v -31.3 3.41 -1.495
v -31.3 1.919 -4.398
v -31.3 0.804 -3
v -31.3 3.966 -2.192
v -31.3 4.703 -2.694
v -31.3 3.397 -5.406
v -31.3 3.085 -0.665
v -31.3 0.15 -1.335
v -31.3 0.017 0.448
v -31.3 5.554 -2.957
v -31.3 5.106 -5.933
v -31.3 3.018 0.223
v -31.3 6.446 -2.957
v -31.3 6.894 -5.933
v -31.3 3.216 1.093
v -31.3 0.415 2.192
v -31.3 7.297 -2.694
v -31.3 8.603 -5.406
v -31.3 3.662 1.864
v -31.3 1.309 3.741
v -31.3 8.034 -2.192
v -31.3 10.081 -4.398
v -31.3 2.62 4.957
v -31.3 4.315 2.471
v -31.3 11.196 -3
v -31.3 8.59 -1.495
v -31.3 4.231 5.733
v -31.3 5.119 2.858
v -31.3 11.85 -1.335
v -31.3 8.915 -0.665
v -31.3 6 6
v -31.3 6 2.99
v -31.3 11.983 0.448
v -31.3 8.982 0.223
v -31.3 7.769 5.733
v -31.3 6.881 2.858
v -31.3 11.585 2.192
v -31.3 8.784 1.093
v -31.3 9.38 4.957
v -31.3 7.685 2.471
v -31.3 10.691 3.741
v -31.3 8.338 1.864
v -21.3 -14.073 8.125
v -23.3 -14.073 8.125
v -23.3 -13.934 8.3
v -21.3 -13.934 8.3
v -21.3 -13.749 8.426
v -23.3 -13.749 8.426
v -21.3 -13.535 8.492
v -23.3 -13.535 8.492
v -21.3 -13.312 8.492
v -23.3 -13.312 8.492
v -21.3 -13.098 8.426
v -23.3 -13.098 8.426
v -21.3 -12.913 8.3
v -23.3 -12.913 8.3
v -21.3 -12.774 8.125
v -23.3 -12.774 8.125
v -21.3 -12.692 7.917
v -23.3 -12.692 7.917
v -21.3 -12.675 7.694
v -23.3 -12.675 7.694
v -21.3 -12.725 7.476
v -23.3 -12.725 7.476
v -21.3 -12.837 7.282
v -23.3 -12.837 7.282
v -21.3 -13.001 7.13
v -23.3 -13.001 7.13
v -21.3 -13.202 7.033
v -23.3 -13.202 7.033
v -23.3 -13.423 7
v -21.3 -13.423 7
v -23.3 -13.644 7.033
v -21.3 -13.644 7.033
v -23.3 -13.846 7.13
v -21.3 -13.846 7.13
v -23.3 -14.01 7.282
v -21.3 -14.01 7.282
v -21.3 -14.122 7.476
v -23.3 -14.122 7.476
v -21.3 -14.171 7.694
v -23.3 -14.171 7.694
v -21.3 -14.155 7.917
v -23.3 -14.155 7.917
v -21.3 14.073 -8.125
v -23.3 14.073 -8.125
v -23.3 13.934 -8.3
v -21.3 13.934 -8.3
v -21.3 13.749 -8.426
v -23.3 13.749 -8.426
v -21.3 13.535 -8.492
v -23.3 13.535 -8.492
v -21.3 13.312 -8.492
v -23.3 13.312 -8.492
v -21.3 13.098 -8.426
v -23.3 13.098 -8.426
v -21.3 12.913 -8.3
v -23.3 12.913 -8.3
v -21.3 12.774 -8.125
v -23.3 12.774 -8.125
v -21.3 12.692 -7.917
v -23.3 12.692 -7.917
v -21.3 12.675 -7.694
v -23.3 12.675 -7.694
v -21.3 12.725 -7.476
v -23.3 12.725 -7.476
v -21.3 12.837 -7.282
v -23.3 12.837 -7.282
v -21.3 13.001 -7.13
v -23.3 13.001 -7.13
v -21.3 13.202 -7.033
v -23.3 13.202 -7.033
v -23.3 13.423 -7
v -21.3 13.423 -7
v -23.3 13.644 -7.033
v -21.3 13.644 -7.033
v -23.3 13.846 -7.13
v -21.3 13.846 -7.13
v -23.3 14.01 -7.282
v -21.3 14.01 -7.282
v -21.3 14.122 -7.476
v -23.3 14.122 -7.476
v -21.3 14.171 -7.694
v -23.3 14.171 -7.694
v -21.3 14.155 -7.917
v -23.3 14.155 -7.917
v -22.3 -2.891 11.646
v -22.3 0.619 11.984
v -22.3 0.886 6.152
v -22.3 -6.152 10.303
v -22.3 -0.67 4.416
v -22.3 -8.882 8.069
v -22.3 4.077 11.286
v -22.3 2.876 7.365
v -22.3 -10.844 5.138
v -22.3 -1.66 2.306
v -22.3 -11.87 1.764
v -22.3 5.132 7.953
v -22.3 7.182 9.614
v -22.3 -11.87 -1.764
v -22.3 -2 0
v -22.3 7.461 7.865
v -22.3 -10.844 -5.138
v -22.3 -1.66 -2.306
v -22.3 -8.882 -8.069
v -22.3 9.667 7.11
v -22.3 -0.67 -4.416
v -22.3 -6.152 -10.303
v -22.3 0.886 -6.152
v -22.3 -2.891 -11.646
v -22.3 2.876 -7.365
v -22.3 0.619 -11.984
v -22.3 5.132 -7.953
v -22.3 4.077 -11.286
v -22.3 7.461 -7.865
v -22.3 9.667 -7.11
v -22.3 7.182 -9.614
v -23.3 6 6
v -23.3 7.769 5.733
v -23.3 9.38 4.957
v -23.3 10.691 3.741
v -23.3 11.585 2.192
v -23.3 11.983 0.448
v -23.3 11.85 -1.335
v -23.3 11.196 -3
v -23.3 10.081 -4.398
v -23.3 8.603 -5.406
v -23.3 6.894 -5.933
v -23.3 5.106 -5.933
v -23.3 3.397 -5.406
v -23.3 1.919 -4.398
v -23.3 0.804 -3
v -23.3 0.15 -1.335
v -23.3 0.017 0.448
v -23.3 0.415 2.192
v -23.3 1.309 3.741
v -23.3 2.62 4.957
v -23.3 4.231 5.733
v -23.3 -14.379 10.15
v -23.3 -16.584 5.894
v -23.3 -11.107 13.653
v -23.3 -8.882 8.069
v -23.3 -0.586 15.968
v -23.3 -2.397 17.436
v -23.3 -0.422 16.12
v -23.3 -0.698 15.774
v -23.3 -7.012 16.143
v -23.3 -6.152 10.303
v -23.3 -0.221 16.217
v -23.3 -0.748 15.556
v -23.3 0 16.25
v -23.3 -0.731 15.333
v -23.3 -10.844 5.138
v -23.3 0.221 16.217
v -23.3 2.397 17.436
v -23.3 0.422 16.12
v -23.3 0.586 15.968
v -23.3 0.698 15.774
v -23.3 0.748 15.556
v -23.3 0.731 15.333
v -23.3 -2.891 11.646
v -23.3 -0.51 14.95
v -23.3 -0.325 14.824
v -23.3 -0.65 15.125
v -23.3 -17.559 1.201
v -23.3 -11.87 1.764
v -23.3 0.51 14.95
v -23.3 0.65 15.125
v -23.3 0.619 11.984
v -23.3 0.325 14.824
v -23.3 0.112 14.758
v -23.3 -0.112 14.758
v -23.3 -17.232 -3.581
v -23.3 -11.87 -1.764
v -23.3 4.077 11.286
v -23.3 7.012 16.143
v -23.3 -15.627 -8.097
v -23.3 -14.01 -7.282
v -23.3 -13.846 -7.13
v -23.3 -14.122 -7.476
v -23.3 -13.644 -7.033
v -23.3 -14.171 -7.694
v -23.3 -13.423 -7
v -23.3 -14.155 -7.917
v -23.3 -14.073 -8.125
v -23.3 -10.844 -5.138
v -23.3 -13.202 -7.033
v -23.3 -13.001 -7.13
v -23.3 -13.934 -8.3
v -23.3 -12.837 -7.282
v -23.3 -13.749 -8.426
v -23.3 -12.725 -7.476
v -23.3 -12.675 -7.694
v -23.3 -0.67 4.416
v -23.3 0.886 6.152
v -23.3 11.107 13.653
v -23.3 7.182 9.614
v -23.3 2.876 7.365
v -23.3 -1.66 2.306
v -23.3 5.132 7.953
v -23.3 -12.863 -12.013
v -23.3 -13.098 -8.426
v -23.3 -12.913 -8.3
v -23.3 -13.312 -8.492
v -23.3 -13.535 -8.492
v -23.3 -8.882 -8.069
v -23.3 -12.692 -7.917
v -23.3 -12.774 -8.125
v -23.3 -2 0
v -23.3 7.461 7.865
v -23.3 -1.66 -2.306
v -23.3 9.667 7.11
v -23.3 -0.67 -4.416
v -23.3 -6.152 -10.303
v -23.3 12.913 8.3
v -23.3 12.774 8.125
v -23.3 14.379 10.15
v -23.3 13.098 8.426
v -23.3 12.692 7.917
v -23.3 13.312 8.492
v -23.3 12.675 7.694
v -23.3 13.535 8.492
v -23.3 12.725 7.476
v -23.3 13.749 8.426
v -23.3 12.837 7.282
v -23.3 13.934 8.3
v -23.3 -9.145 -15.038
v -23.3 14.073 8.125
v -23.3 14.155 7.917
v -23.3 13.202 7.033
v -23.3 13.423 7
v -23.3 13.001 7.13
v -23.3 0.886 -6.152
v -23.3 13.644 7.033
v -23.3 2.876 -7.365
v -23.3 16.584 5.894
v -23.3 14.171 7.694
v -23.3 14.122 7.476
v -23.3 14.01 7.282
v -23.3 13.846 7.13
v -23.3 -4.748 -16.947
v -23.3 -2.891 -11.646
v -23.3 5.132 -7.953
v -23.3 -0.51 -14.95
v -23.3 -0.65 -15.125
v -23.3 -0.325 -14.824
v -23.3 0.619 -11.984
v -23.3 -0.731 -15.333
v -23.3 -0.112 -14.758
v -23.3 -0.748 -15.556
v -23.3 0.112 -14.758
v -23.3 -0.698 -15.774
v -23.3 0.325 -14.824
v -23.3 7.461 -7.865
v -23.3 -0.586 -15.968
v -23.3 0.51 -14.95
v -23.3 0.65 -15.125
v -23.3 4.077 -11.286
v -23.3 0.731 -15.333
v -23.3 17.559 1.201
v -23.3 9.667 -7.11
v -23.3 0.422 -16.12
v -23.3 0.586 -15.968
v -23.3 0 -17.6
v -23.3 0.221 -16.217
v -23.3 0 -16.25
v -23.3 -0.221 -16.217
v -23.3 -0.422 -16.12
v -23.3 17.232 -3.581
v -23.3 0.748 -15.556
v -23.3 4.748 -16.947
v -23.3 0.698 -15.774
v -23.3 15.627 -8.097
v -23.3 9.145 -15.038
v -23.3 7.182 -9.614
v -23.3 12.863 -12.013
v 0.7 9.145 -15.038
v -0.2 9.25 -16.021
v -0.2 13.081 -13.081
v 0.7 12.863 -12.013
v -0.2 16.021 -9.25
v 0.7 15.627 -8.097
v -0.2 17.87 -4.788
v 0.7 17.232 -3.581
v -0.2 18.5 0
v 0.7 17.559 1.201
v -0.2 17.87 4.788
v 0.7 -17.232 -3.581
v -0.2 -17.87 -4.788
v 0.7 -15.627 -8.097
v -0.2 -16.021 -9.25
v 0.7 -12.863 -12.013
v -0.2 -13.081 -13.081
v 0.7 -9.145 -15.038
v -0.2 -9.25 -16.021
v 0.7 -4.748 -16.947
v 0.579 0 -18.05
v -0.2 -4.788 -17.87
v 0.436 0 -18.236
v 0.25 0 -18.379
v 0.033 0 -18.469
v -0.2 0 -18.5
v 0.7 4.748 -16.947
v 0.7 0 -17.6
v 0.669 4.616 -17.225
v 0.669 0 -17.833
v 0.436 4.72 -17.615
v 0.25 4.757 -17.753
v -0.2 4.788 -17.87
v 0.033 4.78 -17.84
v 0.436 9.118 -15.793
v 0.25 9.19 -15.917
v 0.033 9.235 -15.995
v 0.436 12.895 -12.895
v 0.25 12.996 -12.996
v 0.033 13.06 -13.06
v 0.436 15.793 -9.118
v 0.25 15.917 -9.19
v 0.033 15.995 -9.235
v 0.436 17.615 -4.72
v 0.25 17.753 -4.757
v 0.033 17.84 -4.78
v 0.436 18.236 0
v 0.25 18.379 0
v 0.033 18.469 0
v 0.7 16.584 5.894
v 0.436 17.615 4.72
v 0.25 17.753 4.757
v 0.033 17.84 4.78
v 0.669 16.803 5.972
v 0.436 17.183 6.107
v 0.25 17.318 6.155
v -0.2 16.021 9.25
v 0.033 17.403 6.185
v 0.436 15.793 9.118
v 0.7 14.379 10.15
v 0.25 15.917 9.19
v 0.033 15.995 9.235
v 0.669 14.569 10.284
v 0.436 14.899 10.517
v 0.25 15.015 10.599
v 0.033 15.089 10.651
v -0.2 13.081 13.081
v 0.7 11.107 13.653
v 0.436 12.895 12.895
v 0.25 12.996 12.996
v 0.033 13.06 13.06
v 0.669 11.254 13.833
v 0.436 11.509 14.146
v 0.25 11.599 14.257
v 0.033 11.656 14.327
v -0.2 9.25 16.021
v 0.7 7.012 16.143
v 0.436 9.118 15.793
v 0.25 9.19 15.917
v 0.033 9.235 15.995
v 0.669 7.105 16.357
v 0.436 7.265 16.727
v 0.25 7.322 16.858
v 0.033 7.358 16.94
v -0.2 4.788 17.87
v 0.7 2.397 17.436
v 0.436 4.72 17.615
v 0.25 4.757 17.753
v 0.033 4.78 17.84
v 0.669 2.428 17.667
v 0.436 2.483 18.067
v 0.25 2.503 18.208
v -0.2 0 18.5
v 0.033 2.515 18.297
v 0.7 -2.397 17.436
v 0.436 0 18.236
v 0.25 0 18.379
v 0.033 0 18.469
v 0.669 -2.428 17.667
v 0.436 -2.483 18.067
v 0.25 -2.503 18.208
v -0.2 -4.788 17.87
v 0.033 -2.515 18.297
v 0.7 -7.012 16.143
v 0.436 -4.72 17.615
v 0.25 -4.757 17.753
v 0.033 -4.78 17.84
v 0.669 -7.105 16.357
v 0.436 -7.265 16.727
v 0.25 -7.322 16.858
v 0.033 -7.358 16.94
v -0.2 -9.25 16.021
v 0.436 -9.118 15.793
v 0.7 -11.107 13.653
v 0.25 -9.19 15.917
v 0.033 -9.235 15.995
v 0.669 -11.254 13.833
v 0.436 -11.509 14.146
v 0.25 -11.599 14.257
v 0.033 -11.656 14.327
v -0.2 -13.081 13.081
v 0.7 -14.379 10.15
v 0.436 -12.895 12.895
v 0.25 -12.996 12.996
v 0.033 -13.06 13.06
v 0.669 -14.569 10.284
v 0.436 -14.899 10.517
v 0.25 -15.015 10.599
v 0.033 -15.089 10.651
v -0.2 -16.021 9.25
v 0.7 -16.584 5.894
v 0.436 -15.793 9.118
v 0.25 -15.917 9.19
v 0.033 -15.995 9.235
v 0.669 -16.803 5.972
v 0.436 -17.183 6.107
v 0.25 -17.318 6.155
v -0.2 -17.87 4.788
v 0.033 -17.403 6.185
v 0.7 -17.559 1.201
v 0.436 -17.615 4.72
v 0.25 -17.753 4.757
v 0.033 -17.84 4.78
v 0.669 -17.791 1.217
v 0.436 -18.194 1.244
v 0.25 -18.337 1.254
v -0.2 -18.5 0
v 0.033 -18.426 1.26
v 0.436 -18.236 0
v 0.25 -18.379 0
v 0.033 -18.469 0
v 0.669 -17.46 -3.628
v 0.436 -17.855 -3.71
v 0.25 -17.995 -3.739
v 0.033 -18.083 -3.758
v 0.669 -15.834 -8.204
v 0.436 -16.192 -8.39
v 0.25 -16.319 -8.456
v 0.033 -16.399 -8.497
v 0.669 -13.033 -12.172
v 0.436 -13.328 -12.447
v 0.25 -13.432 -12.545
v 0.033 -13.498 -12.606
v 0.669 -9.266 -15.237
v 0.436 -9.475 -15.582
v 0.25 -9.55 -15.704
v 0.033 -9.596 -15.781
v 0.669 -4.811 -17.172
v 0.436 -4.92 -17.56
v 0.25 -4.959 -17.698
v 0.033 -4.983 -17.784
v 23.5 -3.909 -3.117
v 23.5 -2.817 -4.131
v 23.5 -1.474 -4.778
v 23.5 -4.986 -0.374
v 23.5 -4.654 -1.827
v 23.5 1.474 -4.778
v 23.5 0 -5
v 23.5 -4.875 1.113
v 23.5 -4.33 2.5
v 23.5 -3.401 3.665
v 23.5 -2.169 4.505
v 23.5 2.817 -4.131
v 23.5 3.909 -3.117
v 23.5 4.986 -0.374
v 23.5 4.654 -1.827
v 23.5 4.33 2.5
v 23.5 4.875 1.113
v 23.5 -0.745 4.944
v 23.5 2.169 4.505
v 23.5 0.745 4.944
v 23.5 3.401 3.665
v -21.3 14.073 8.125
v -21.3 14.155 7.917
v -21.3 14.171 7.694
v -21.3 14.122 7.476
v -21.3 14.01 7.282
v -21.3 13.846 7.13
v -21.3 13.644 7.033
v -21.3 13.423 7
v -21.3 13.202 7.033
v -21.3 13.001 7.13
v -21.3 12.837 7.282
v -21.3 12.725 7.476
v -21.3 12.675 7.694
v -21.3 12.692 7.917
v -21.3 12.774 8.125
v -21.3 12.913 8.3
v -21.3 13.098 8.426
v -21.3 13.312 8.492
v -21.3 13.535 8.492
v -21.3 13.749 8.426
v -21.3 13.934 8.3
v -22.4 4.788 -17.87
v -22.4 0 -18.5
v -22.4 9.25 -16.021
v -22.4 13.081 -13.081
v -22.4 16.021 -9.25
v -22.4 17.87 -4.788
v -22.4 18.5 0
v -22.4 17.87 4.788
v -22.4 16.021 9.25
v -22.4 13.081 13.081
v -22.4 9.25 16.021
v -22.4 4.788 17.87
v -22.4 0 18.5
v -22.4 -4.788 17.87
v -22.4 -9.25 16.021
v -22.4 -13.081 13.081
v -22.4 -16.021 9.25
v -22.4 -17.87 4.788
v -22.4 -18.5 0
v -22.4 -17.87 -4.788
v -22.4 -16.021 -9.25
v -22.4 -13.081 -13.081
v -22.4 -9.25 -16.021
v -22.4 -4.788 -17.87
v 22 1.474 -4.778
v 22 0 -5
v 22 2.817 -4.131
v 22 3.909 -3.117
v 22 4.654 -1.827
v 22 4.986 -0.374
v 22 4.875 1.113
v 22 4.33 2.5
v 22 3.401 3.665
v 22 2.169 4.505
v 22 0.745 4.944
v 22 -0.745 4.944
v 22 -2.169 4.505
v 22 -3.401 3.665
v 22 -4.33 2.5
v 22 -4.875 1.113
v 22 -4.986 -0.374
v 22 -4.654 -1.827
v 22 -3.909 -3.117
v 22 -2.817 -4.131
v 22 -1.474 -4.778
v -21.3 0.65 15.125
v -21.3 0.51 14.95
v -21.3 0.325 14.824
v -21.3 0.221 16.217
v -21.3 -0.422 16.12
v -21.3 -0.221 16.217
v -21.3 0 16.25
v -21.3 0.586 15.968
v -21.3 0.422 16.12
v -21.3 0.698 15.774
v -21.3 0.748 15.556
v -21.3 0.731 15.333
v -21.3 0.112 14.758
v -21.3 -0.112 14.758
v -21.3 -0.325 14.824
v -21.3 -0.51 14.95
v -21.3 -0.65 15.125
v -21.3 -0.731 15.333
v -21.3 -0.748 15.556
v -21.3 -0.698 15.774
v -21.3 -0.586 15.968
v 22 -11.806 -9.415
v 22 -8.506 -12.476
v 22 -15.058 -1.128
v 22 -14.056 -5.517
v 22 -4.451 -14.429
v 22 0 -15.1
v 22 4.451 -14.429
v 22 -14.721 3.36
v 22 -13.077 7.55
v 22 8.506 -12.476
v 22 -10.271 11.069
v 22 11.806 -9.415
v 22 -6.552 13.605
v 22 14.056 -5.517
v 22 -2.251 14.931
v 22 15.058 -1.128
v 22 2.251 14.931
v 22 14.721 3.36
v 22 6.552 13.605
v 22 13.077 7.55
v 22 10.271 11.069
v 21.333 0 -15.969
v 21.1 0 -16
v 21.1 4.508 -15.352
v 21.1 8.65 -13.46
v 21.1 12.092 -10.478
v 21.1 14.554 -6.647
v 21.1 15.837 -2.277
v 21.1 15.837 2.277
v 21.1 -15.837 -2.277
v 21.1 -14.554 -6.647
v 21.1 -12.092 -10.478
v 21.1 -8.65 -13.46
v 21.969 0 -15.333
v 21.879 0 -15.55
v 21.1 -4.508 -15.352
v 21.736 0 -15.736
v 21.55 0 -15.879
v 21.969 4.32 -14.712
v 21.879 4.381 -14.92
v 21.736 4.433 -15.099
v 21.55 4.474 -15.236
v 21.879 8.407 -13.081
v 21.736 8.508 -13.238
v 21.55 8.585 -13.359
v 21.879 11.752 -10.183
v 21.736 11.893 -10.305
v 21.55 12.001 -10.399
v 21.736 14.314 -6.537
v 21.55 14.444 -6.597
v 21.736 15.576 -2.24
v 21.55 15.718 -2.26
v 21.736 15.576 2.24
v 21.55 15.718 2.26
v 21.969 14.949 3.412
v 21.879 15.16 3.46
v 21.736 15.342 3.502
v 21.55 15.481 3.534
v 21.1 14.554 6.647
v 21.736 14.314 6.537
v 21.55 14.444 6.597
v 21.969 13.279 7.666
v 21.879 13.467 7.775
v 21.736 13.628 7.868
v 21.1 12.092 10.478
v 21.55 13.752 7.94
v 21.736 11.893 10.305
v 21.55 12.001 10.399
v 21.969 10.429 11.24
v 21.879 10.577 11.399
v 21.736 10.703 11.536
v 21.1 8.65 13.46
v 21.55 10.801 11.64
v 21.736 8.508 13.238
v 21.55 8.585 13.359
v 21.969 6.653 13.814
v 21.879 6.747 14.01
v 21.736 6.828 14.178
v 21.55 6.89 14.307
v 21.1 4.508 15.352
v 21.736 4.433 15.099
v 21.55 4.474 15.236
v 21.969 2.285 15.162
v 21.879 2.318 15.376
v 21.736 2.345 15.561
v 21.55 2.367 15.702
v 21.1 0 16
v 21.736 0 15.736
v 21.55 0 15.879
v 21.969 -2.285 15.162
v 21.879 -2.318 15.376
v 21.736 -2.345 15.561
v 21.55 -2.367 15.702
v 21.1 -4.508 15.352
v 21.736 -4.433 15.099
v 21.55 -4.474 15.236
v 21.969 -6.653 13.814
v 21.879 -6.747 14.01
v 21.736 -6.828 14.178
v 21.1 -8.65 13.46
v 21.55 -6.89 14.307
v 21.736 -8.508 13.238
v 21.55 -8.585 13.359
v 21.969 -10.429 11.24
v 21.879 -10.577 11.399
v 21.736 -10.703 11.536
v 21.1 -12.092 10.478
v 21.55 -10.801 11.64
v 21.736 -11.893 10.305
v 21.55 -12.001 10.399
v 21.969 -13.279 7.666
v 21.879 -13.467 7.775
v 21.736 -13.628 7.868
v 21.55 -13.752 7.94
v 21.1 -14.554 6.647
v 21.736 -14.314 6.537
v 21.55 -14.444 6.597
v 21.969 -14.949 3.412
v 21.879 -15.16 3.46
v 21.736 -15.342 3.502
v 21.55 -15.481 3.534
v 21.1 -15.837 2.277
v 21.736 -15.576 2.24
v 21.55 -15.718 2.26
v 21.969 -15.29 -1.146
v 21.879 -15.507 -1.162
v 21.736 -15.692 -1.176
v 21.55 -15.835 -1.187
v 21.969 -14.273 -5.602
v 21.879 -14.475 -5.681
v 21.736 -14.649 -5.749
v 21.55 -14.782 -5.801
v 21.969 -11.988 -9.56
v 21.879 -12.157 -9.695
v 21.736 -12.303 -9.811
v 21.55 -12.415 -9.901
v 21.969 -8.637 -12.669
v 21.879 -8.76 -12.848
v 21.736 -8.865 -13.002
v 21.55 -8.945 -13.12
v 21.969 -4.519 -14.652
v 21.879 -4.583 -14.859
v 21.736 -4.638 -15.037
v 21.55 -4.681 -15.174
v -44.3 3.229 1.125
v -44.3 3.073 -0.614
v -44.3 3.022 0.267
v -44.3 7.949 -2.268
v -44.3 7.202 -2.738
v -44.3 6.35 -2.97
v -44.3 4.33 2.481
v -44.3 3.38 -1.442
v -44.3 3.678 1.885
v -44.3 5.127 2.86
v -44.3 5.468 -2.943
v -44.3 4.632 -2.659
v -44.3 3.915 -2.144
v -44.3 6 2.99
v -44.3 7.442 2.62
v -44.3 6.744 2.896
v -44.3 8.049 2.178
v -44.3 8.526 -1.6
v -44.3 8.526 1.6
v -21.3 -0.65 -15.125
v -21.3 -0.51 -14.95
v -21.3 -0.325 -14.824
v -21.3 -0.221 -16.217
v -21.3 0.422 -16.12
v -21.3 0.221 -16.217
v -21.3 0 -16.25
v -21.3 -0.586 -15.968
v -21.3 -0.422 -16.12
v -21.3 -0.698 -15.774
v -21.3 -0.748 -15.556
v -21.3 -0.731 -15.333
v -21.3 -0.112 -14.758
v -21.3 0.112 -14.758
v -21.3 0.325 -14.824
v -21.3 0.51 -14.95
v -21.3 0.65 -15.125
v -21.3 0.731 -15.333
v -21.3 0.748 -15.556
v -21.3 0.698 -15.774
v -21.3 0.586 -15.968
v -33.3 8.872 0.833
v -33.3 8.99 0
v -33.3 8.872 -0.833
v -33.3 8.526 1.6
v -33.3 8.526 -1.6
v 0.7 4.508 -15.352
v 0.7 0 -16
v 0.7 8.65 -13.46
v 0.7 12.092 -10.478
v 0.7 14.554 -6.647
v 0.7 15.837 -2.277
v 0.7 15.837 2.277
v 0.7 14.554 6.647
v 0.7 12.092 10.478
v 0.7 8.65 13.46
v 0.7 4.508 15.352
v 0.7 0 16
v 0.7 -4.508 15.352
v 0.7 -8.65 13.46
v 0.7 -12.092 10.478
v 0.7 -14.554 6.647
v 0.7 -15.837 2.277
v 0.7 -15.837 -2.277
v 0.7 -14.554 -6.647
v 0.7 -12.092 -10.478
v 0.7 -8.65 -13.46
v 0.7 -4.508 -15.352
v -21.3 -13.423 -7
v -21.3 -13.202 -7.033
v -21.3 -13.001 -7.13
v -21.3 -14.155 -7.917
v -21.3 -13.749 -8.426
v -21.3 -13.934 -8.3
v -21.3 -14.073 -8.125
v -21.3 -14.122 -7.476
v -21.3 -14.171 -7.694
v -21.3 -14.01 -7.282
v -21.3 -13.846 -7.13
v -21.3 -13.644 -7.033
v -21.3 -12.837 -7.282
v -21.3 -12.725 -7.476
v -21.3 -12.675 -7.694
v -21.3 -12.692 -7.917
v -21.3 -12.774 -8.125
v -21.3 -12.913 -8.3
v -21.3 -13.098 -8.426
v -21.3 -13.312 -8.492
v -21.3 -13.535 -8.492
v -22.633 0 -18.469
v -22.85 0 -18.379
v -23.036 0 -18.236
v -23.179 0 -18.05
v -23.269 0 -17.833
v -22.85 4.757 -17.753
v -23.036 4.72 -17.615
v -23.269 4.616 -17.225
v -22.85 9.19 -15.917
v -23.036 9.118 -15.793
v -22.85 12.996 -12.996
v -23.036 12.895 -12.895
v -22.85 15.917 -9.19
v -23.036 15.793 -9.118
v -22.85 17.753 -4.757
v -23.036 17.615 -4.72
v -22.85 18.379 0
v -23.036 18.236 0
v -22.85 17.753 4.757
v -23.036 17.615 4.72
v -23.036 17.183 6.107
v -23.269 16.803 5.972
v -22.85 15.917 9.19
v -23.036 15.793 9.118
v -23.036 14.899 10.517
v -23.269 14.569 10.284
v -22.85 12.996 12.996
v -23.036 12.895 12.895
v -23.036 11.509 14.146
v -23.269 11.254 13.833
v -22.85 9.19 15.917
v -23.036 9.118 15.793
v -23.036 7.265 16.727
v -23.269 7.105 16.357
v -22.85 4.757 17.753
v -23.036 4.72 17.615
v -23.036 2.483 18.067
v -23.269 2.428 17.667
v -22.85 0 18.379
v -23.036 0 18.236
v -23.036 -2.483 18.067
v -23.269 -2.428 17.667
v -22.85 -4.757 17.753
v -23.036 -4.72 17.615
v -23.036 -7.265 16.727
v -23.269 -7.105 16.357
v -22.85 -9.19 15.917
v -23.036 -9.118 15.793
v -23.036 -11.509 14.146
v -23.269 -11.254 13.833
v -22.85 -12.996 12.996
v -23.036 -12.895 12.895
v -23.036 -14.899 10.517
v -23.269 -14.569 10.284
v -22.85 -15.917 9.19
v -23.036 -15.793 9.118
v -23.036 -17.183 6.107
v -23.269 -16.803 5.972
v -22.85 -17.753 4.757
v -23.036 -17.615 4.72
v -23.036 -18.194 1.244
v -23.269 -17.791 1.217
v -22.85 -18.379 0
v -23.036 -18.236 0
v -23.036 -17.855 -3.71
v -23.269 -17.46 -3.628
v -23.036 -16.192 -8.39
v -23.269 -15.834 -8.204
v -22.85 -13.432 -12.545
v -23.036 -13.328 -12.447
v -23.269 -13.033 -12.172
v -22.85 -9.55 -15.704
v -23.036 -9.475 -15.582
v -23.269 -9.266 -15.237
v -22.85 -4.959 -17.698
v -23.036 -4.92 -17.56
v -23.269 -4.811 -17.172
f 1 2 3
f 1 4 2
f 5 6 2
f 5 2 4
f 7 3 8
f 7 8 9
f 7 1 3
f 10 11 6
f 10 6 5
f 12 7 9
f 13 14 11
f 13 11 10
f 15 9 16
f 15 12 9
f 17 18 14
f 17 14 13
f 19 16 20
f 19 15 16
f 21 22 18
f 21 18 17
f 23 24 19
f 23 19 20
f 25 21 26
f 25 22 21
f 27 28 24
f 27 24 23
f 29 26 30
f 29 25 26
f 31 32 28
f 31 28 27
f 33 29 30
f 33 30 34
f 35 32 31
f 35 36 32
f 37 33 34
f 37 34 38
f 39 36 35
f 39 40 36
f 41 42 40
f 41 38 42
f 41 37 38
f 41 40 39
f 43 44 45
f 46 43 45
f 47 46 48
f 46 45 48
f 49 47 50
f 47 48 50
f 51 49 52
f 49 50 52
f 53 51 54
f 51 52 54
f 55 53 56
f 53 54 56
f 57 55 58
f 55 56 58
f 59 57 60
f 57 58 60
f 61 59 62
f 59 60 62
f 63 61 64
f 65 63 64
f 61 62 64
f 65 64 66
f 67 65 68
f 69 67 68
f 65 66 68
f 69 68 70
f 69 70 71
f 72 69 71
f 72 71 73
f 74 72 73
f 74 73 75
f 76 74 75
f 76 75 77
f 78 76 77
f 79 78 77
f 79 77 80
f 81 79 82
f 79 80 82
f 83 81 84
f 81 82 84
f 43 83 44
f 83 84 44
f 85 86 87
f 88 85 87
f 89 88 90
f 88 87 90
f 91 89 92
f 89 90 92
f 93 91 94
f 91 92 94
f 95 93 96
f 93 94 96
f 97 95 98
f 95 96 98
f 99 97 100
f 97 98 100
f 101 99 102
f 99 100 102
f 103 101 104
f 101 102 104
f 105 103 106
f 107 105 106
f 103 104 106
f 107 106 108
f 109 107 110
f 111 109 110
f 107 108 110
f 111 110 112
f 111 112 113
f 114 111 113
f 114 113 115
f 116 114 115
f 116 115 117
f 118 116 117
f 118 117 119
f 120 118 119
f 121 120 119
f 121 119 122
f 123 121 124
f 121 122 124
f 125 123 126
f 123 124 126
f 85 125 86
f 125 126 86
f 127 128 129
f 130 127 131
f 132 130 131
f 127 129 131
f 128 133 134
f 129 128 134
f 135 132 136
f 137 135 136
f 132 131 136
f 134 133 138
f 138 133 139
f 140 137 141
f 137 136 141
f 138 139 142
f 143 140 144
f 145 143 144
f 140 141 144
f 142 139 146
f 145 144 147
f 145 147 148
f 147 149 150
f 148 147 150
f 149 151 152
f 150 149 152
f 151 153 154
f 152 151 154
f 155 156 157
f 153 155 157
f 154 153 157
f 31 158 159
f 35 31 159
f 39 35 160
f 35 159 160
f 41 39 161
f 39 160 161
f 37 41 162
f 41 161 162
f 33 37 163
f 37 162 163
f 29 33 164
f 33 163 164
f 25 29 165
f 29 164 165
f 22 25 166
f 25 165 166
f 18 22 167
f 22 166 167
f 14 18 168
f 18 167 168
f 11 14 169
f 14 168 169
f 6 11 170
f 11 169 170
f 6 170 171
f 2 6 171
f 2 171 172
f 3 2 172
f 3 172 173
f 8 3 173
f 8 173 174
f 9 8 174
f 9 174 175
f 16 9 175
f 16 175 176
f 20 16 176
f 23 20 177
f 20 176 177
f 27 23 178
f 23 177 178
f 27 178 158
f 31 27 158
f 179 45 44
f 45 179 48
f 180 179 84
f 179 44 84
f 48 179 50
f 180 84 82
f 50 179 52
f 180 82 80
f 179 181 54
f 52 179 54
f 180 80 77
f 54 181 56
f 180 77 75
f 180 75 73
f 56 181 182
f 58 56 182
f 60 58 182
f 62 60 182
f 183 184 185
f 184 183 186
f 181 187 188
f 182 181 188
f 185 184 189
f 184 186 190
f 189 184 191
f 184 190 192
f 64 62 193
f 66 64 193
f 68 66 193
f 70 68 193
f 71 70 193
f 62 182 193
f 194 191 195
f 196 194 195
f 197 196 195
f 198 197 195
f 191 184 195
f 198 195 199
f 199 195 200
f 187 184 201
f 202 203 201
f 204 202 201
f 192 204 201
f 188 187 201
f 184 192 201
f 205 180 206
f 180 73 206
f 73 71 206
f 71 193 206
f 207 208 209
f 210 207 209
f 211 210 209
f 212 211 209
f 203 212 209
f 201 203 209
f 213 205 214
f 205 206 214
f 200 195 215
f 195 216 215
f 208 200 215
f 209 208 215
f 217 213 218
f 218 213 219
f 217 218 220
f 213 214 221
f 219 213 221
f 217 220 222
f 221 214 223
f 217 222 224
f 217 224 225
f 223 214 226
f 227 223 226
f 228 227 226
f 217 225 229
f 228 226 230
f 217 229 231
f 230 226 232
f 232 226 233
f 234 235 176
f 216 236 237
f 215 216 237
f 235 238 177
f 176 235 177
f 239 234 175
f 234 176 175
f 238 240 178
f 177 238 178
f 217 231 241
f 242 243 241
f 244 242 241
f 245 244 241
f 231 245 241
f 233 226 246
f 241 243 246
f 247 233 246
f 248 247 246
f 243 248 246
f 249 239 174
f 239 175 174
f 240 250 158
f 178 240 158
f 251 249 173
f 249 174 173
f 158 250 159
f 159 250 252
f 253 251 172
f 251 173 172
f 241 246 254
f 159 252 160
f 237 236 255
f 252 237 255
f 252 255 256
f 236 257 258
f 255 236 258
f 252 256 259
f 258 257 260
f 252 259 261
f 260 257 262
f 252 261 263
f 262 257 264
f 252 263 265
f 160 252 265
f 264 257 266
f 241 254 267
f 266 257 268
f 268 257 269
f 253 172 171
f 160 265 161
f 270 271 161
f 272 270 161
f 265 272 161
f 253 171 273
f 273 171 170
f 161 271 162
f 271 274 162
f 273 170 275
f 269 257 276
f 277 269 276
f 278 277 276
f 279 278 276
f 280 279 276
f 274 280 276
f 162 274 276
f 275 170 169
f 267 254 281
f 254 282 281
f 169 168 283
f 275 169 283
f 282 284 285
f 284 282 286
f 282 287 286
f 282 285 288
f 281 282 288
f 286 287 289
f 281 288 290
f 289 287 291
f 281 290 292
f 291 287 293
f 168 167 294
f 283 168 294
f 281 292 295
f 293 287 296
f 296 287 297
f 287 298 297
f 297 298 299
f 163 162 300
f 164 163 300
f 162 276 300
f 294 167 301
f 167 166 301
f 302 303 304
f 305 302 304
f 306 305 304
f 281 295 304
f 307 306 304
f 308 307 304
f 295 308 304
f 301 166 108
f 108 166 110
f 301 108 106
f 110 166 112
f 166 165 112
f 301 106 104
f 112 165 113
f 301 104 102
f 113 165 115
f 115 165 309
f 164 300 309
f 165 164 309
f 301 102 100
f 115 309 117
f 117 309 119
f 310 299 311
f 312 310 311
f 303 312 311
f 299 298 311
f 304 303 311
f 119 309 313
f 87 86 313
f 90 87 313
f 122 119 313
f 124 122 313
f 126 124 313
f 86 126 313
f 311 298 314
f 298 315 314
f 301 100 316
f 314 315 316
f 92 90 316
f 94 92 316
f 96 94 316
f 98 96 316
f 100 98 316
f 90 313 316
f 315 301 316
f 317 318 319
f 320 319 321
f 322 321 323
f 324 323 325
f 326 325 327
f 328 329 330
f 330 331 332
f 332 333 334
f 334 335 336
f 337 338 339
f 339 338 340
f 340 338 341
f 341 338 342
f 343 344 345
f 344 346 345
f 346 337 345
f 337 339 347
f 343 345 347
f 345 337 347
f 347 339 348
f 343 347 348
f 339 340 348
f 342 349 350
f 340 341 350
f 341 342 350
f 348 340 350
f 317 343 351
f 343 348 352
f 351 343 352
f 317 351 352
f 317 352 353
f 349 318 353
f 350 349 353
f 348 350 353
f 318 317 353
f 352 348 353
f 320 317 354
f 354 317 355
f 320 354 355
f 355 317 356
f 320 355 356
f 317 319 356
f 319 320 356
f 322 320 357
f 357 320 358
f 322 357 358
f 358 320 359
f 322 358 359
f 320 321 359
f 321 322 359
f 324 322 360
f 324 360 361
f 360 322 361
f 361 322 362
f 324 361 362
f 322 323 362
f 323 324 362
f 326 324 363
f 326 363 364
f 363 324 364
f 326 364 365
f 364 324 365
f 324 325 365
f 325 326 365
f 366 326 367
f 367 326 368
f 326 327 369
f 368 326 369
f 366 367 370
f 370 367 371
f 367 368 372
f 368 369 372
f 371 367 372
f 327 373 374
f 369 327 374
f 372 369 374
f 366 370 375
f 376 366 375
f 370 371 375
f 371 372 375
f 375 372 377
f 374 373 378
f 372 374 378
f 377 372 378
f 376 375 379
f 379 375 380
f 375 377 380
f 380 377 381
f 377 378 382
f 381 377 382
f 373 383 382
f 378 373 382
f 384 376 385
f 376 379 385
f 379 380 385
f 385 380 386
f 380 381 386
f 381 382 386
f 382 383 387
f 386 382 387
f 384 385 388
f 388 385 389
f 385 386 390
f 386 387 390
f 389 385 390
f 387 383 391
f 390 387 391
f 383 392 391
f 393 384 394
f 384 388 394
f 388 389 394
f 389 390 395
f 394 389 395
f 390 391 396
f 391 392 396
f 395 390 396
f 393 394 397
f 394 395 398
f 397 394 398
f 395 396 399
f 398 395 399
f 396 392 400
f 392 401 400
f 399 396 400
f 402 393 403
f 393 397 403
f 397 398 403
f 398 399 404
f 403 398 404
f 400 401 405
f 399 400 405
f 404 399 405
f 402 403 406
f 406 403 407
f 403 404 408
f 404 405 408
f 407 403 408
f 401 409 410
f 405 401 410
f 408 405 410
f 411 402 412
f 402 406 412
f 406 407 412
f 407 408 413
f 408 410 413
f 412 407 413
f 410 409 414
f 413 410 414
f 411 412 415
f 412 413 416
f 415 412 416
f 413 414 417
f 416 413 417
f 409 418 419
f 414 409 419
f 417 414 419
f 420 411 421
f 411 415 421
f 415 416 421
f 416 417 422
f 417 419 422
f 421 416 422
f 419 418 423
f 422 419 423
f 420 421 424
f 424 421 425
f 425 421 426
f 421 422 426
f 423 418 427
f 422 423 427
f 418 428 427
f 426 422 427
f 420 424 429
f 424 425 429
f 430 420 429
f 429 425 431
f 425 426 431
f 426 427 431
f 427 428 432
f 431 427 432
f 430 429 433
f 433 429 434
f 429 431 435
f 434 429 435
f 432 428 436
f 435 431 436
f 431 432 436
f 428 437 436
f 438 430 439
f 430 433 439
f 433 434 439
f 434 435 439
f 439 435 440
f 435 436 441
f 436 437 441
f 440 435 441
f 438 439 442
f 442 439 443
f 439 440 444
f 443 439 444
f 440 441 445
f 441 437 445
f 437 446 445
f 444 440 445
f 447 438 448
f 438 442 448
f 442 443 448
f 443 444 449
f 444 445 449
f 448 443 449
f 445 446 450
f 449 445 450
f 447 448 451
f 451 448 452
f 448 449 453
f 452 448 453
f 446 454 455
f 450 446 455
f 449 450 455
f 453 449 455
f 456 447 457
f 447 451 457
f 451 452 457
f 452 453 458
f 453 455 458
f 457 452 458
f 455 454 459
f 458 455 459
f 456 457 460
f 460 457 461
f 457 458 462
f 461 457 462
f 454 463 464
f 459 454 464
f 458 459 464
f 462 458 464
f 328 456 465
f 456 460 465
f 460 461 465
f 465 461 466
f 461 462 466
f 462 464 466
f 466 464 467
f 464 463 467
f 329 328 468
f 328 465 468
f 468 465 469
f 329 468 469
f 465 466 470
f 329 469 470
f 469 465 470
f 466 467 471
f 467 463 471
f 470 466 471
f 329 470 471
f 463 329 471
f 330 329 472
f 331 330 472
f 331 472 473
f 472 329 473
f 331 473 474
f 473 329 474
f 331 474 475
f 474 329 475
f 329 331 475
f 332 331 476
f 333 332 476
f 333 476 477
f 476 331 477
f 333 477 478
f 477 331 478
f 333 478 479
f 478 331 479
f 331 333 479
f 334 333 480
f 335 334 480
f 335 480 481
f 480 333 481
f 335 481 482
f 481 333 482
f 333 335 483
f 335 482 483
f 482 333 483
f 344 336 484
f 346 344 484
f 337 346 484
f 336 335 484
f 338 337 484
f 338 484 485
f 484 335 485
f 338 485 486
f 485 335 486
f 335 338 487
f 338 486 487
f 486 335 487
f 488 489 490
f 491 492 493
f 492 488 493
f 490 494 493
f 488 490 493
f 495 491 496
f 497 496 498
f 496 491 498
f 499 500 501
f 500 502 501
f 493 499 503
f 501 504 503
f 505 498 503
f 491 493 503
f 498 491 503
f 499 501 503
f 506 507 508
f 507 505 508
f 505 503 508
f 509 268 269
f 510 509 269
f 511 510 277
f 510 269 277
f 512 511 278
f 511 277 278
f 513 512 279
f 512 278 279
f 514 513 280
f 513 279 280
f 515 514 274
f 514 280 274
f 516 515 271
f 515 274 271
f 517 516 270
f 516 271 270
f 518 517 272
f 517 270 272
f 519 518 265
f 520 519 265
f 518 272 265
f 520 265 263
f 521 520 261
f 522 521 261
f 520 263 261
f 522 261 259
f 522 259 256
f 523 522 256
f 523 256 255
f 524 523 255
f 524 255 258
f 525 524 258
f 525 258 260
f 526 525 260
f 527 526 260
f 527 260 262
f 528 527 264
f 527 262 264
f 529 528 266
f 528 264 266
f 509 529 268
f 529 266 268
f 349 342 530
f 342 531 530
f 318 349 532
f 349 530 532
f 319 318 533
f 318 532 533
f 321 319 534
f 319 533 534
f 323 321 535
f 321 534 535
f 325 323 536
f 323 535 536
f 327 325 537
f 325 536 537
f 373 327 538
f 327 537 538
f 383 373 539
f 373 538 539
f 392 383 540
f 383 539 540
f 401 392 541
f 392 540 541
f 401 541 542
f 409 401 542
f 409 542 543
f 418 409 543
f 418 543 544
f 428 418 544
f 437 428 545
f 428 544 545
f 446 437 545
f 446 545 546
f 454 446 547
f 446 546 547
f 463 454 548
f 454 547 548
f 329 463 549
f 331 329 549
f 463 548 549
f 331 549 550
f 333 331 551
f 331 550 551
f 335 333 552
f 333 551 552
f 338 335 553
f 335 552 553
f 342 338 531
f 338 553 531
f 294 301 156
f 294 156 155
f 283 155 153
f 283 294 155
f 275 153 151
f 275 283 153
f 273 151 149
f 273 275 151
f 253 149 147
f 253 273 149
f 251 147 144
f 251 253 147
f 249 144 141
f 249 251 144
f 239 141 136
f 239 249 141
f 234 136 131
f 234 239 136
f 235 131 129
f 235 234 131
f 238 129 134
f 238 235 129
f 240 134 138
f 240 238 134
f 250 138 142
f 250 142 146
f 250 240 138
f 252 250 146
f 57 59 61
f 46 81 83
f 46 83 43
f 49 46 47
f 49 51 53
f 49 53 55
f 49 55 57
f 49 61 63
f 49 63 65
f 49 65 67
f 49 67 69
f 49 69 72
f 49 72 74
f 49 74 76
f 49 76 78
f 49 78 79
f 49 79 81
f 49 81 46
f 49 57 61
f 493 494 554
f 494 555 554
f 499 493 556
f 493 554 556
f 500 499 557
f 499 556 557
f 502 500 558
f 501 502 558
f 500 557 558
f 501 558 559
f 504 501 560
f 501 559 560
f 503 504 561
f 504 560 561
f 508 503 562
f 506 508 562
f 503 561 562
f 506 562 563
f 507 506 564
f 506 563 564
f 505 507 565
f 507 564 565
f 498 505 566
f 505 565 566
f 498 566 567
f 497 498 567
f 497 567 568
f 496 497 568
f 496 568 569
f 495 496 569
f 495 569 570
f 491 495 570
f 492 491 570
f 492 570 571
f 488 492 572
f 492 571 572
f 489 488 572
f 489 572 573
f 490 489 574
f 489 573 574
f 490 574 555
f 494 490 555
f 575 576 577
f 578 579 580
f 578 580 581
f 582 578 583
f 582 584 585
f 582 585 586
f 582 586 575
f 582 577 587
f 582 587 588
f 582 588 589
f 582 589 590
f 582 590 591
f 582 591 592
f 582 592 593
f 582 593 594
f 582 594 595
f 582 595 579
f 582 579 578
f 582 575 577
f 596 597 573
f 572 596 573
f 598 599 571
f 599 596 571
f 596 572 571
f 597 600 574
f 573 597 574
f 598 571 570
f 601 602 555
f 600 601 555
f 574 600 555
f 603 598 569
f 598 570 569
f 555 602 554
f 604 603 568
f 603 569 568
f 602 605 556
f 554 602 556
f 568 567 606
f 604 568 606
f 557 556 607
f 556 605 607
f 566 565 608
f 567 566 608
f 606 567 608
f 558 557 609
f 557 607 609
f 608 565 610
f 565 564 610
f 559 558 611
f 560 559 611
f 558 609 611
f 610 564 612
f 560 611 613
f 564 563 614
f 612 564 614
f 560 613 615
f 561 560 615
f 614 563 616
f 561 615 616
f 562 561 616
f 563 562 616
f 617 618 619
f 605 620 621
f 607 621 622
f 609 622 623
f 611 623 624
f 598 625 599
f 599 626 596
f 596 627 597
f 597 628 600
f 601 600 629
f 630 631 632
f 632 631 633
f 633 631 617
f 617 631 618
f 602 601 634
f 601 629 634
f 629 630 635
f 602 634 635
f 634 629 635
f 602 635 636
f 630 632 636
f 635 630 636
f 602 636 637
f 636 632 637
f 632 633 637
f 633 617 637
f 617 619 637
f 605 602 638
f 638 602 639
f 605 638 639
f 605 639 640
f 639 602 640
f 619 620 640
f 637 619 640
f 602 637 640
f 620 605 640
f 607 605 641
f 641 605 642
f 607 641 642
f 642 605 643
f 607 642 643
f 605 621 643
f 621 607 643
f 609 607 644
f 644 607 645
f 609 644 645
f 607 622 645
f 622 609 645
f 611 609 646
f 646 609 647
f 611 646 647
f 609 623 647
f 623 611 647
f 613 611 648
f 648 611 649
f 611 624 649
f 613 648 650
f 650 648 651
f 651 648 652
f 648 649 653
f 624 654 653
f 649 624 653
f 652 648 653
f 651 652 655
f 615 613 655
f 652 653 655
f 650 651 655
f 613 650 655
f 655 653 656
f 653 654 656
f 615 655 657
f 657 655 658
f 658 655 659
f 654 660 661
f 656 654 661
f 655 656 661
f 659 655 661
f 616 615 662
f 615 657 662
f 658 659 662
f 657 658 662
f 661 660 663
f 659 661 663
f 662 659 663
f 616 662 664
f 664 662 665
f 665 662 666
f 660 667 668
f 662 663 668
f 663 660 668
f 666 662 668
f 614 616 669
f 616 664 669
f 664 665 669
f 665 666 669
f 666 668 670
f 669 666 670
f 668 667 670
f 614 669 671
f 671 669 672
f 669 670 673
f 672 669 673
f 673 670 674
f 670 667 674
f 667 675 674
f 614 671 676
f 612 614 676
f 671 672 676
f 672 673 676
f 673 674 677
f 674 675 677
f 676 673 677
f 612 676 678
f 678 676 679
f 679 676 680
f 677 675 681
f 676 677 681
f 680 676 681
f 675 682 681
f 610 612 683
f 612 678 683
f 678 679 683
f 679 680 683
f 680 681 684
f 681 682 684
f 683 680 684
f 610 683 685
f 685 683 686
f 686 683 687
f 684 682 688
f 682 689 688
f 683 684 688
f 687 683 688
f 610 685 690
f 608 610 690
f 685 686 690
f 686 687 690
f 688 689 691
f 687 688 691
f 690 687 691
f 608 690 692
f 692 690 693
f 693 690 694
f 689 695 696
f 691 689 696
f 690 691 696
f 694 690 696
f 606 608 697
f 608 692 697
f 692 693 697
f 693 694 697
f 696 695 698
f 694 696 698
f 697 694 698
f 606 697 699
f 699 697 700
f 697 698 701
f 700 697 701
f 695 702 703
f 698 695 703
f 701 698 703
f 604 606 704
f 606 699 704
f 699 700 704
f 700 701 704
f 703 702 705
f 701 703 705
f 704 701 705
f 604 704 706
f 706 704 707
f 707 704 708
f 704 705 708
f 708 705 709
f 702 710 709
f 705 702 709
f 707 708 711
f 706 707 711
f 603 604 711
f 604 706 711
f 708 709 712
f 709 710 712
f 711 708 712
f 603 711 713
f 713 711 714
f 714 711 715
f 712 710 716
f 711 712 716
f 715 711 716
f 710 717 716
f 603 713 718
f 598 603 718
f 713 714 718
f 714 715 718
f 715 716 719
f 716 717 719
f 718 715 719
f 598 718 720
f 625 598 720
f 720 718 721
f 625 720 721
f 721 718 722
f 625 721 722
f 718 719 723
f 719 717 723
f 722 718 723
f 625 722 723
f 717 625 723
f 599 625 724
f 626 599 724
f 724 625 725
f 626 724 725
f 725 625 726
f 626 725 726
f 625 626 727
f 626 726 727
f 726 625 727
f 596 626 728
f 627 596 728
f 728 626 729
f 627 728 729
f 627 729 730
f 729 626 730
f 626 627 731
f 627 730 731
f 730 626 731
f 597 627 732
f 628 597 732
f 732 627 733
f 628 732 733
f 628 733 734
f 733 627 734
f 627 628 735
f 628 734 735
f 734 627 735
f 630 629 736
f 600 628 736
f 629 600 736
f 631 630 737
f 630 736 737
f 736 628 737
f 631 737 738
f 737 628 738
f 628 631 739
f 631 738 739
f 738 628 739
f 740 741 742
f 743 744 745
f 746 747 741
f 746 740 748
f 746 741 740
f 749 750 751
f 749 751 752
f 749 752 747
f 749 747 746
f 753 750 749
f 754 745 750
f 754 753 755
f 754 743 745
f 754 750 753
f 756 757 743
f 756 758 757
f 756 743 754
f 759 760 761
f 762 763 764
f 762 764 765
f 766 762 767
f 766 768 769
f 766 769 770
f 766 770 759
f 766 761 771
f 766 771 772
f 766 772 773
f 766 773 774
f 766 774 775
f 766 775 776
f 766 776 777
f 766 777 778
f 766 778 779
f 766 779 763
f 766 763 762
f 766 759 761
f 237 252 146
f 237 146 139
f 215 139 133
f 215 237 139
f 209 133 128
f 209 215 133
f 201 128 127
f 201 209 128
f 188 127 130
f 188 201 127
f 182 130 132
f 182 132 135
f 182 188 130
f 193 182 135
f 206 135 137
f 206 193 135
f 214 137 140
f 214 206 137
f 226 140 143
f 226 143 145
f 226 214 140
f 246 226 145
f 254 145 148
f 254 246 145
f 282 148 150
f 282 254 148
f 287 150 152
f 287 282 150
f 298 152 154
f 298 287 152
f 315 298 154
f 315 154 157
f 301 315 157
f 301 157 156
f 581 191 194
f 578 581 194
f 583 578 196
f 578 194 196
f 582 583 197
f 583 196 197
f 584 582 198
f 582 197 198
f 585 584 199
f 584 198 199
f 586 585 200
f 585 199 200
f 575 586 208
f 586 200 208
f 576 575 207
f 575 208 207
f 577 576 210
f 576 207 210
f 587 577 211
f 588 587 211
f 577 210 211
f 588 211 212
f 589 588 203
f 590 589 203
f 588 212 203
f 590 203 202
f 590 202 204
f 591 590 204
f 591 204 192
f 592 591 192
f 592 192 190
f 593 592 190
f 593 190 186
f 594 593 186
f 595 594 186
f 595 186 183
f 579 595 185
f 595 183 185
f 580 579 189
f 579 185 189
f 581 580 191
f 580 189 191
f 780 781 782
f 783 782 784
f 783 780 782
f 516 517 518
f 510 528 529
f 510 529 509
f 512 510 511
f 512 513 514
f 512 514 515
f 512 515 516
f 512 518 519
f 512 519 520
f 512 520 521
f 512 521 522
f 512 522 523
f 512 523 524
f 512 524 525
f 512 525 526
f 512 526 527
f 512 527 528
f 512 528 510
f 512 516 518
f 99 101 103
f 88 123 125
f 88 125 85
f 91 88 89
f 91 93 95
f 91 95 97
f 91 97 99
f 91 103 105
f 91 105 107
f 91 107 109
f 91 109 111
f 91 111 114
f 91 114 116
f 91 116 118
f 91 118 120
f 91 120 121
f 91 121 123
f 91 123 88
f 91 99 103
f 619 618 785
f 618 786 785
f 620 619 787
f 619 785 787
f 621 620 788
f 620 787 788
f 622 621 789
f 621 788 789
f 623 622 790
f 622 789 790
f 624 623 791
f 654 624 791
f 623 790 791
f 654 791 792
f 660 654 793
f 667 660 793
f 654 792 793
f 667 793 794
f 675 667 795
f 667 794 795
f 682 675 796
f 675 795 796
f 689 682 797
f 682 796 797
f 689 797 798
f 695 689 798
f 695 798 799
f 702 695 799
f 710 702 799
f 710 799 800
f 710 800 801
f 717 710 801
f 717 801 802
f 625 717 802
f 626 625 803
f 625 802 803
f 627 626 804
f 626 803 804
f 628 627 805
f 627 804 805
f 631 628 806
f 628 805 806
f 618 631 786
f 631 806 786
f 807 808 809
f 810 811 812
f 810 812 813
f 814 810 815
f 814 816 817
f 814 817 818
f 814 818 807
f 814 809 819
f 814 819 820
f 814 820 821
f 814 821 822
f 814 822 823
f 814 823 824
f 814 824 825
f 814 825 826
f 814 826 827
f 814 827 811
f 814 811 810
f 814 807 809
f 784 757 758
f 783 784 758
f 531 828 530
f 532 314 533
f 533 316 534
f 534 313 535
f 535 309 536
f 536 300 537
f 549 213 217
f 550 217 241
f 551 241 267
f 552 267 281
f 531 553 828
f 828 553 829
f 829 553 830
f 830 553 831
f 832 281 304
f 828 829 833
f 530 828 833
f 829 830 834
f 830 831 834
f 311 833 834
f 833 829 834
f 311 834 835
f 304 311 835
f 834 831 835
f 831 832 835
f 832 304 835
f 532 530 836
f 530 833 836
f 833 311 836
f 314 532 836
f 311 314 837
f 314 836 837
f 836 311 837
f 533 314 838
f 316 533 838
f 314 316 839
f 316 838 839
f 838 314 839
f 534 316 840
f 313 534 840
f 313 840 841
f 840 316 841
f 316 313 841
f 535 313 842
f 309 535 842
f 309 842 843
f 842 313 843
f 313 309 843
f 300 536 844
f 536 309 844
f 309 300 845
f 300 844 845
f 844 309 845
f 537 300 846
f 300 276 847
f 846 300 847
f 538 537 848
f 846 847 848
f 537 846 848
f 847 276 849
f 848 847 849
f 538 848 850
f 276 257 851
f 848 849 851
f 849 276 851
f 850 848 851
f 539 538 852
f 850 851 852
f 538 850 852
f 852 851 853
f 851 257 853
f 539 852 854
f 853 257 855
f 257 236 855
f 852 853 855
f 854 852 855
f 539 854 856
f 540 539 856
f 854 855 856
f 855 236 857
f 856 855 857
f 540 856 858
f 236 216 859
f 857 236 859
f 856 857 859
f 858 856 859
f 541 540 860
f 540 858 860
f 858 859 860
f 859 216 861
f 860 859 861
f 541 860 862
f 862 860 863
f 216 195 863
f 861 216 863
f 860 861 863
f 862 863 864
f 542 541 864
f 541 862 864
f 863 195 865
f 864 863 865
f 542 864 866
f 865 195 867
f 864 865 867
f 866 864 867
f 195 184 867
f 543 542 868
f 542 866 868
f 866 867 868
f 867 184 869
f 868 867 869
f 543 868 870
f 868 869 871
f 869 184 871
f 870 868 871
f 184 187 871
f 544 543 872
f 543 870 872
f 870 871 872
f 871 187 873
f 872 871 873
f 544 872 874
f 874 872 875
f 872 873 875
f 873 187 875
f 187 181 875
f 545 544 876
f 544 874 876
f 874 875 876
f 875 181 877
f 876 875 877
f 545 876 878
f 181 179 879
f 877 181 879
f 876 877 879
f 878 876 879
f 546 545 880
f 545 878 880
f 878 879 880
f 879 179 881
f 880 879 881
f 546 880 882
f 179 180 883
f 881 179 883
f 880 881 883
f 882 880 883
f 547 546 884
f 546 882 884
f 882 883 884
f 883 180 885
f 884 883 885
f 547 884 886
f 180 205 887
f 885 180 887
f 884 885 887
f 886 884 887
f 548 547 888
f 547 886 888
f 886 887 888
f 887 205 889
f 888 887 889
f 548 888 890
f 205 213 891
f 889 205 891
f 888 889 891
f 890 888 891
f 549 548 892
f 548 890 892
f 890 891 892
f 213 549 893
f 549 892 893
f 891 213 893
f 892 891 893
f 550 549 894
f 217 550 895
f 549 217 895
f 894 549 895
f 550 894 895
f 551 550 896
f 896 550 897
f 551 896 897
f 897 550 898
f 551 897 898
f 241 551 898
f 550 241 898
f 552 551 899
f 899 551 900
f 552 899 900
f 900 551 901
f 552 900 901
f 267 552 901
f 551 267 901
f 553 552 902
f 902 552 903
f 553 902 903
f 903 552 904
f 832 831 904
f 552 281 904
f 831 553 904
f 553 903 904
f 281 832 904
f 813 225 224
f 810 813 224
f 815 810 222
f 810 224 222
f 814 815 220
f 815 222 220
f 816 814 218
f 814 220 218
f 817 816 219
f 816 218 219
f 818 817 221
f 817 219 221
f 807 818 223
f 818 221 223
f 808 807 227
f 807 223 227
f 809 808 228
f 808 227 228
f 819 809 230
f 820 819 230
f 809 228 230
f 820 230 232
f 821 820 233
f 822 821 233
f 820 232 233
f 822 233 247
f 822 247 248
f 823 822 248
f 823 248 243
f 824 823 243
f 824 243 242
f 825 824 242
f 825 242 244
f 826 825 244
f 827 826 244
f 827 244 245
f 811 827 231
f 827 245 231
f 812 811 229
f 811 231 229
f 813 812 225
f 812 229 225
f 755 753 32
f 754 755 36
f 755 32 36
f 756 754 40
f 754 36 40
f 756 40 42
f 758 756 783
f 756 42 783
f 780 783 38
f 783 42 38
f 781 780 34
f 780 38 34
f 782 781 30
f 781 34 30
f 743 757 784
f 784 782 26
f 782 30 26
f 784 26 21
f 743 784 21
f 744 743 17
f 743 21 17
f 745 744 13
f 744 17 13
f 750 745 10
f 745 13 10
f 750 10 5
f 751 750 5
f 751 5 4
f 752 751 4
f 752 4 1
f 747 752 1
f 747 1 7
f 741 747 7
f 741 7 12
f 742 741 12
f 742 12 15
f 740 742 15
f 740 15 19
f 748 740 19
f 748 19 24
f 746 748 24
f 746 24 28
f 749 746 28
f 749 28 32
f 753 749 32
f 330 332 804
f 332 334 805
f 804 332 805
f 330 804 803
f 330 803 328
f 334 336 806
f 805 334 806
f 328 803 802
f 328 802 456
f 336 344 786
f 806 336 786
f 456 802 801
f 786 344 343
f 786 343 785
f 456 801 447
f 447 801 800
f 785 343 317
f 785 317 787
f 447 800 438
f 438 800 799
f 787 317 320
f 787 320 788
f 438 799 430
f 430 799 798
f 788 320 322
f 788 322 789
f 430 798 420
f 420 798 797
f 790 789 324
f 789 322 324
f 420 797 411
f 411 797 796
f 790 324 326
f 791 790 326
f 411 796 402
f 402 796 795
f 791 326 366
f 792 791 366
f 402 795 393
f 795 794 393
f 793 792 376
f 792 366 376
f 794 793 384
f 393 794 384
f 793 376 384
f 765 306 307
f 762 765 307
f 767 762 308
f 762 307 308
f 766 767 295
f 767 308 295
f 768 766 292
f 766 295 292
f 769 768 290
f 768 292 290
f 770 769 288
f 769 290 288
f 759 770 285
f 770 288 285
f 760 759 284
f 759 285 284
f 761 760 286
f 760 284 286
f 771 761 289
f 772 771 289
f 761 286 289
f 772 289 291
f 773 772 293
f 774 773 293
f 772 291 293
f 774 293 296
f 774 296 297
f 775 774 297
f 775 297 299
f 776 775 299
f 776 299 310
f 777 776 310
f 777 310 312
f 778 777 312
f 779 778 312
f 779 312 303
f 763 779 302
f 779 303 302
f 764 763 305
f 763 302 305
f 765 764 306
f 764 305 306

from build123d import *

# Parameters (mm, degrees)
SKETCH2_R           = 6
BOSS_EXTRUDE1_DEPTH = 8
SKETCH3_R           = 2.990422361
BOSS_EXTRUDE2_DEPTH = 13
CUT_EXTRUDE1_DEPTH  = 11
CUT_EXTRUDE2_DEPTH  = 1
SKETCH7_R           = 0.75
CUT_EXTRUDE4_DEPTH  = 2
CIRPATTERN1_COUNT   = 6


with BuildPart() as part:
    # Sketch1 → Revolve2 (revolve)
    with BuildSketch(Plane(origin=(0, 0, 0), x_dir=(1, 0, 0), z_dir=(0, 1, 0))):
        with BuildLine():
            Line((-23.3, 0), (23.5, 0))
            Line((23.5, 0), (23.5, 5))
            Line((23.5, 5), (22, 5))
            Line((22, 5), (22, 15.1))
            ThreePointArc((22, 15.1), (21.736396103, 15.736396103), (21.1, 16))
            Line((21.1, 16), (0.7, 16))
            Line((0.7, 16), (0.7, 17.6))
            ThreePointArc((0.7, 17.6), (0.436396103, 18.236396103), (-0.2, 18.5))
            Line((-0.2, 18.5), (-22.4, 18.5))
            ThreePointArc((-22.4, 18.5), (-23.036396103, 18.236396103), (-23.3, 17.6))
            Line((-23.3, 17.6), (-23.3, 0))
        make_face()
    revolve(axis=Axis((-35.546651827, 0, 0), (1, 0, 0)))

    # Sketch2 → Boss-Extrude1 (add)
    with BuildSketch(Plane.ZY.offset(23.3)):
        with Locations((0, 6)):
            Circle(SKETCH2_R)
    extrude(amount=BOSS_EXTRUDE1_DEPTH)

    # Sketch3 → Boss-Extrude2 (add)
    with BuildSketch(Plane.ZY.offset(31.3)):
        with Locations((0, 6)):
            Circle(SKETCH3_R)
    extrude(amount=BOSS_EXTRUDE2_DEPTH)

    # Sketch5 → Cut-Extrude1 (cut)
    with BuildSketch(Plane.ZY.offset(44.3)):
        with BuildLine():
            Line((-1.6, 8.526385936), (1.6, 8.526385936))
            ThreePointArc((1.6, 8.526385936), (0, 8.990422361), (-1.6, 8.526385936))
        make_face()
    extrude(amount=-CUT_EXTRUDE1_DEPTH, mode=Mode.SUBTRACT)

    # Sketch6 → Cut-Extrude2 (cut)
    with BuildSketch(Plane.ZY.offset(23.3)):
        with BuildLine():
            ThreePointArc((-7.110243003, 9.666666667), (0, -2), (7.110243003, 9.666666667))
            ThreePointArc((7.110243003, 9.666666667), (0, -12), (-7.110243003, 9.666666667))
        make_face()
    extrude(amount=-CUT_EXTRUDE2_DEPTH, mode=Mode.SUBTRACT)

    # Sketch7 → Cut-Extrude4 (cut)
    with BuildSketch(Plane.ZY.offset(23.3)):
        with Locations((15.5, 0)):
            Circle(SKETCH7_R)
    cut_extrude4 = extrude(amount=-CUT_EXTRUDE4_DEPTH, mode=Mode.SUBTRACT)

    # CirPattern1: Cut-Extrude4 ×6 about axis
    cirpattern1_axis = Axis((0, 0, 0), (1, 0, 0))
    for i in range(1, CIRPATTERN1_COUNT):
        add(cut_extrude4.rotate(cirpattern1_axis, i * 360 / CIRPATTERN1_COUNT), mode=Mode.SUBTRACT)


solid = part.part
